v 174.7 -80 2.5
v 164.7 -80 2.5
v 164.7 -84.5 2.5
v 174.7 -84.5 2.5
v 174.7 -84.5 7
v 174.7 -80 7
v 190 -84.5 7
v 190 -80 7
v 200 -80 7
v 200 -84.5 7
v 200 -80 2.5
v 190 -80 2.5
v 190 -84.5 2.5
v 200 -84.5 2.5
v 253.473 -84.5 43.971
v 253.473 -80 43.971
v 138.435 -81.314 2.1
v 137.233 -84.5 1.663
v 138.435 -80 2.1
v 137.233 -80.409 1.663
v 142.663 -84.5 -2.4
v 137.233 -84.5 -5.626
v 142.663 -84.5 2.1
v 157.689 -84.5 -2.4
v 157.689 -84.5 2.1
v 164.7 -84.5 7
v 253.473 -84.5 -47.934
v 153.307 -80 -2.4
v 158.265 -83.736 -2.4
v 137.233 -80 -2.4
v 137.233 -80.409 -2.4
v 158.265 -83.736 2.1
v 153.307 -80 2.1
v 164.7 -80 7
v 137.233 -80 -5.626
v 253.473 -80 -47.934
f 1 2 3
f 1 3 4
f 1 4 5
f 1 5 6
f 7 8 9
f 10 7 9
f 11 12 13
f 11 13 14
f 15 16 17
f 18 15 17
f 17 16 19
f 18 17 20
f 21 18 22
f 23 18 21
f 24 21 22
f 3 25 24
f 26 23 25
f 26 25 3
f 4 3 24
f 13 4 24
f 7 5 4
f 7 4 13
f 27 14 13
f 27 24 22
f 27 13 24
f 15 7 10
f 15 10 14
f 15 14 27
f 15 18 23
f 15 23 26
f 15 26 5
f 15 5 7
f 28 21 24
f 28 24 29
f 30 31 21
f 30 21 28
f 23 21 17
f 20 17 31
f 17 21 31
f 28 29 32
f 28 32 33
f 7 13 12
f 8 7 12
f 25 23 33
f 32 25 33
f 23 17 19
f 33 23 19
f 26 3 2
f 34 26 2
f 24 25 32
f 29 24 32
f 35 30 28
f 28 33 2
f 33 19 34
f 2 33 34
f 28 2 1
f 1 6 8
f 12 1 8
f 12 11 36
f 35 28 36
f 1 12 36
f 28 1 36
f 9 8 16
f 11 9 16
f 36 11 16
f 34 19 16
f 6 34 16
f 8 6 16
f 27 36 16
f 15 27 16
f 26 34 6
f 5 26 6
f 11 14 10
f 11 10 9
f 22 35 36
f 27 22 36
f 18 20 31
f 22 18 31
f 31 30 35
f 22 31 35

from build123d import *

# Parameters (mm, degrees)
BOX005_W               = 10
BOX005_H               = 154
BOX005_DEPTH           = 4.5
BOX005_PLACEMENT_ANGLE = 53
BOX001_W               = 10
BOX001_H               = 232
BOX001_DEPTH           = 4.5
BOX_W                  = 10
BOX_H                  = 232
BOX_DEPTH              = 4.5
PAD_DEPTH              = 4.5


with BuildPart() as left_front_spar:
    # Box005 → Box005 (new body)
    with BuildSketch(Plane.XY):
        with Locations((5, 77)):
            Rectangle(BOX005_W, BOX005_H)
    extrude(amount=BOX005_DEPTH)


with BuildPart() as left_front_spar_1:
    # Box005 placement: moved
    add(left_front_spar.part.moved(Location((152.246967, -91.722363, -2.4))).rotate(Axis((152.246967, -91.722363, -2.4), (0, 0, 1)), BOX005_PLACEMENT_ANGLE))


with BuildPart() as cube001:
    # Box001 → Box001 (new body)
    with BuildSketch(Plane(origin=(164.7, -92.4, 2.5), x_dir=(1, 0, 0), z_dir=(0, 0, 1))):
        with Locations((5, 116)):
            Rectangle(BOX001_W, BOX001_H)
    extrude(amount=BOX001_DEPTH)


with BuildPart() as cube:
    # Box → Box (new body)
    with BuildSketch(Plane(origin=(190, -89.9, 2.5), x_dir=(1, 0, 0), z_dir=(0, 0, 1))):
        with Locations((5, 116)):
            Rectangle(BOX_W, BOX_H)
    extrude(amount=BOX_DEPTH)


with BuildPart() as cut029:
    # Sketch → Pad (new body)
    with BuildSketch(Plane.XZ):
        Polygon((-112.766838, 5.66261), (-112.766838, -1.625728), (3.473136, -43.933619), (3.473136, 47.970501), align=None)
    extrude(amount=PAD_DEPTH)


with BuildPart() as cut029_1:
    # Body placement: moved
    add(cut029.part.moved(Location((250, -80, -4))))

    # Cut010: cut Cube
    add(cube.part, mode=Mode.SUBTRACT)

    # Cut022: cut Cube001
    add(cube001.part, mode=Mode.SUBTRACT)

    # Cut029: cut left front spar
    add(left_front_spar_1.part, mode=Mode.SUBTRACT)


solid = cut029_1.part
